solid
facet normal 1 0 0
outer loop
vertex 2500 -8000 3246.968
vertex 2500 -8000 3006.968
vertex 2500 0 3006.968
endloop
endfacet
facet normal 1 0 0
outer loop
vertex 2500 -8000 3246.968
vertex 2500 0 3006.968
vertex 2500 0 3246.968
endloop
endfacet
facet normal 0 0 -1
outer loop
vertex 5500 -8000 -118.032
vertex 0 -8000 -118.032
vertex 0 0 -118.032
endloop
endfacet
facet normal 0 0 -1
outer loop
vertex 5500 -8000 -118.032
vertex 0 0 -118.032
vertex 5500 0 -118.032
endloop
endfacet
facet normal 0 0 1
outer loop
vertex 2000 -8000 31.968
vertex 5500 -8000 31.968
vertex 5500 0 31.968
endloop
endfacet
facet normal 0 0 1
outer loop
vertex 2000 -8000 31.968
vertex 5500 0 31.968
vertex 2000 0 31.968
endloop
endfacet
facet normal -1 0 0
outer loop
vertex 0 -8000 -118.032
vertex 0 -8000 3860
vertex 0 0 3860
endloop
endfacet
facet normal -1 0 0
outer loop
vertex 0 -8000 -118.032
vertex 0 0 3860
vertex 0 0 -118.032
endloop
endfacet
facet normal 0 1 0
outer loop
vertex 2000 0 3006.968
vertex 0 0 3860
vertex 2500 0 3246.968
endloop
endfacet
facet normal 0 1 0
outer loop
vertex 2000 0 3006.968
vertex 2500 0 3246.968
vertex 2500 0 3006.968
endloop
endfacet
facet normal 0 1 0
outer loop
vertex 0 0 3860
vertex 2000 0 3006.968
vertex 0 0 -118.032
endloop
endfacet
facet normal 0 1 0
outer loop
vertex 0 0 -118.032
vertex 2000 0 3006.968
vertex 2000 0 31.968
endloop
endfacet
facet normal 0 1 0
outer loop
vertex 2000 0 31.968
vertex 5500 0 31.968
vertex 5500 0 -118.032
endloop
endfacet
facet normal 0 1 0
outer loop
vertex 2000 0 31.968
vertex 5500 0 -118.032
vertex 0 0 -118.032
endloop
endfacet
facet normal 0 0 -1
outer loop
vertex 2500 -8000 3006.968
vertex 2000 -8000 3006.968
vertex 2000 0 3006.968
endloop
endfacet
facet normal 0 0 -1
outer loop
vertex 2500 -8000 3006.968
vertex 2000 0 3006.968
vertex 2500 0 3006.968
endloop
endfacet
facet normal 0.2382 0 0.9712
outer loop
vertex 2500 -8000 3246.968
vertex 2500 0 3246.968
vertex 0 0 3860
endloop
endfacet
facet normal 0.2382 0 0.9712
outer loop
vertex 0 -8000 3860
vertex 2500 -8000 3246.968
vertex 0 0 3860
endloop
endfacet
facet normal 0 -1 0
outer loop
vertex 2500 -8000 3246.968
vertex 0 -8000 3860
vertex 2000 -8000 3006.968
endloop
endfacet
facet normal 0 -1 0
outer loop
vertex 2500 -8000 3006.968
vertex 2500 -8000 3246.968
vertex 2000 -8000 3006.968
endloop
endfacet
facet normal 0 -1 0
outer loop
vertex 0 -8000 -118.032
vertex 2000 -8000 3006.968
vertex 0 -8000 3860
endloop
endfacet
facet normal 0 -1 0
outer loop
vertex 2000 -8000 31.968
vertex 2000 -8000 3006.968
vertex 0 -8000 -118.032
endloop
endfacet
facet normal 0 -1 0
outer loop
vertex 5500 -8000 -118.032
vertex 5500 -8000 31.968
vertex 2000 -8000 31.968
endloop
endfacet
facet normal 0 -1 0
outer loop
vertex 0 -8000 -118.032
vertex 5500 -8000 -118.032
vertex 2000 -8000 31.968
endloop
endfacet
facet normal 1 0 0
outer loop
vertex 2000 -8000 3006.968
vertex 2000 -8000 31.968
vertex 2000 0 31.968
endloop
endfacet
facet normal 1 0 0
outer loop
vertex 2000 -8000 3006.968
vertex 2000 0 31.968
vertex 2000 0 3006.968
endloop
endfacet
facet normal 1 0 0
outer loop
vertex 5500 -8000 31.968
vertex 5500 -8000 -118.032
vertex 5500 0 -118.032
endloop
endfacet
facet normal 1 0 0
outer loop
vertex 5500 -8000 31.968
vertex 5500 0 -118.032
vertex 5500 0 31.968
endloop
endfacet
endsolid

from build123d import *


# Not quite as in the source:
# - a feature names something its author has since deleted; it is built from what else it names


with BuildPart() as f2:
    # F2: sweep along a path in F1
    with BuildLine(Plane.YZ) as f2_path:
        Line((0, 0), (-8000, 0))
    # F0 (on Front) → F2 (sweep)
    with BuildSketch(Plane.XZ):
        Polygon((5500, 31.9677448273), (2000, 31.9677448273), (2000, 3006.9677448273), (2500, 3006.9677448273), (2500, 3246.9677448273), (0, 3860), (0, 0), (0, -118.0322551727), (5500, -118.0322551727), align=None)
    sweep(path=f2_path.line)


solid = f2.part
